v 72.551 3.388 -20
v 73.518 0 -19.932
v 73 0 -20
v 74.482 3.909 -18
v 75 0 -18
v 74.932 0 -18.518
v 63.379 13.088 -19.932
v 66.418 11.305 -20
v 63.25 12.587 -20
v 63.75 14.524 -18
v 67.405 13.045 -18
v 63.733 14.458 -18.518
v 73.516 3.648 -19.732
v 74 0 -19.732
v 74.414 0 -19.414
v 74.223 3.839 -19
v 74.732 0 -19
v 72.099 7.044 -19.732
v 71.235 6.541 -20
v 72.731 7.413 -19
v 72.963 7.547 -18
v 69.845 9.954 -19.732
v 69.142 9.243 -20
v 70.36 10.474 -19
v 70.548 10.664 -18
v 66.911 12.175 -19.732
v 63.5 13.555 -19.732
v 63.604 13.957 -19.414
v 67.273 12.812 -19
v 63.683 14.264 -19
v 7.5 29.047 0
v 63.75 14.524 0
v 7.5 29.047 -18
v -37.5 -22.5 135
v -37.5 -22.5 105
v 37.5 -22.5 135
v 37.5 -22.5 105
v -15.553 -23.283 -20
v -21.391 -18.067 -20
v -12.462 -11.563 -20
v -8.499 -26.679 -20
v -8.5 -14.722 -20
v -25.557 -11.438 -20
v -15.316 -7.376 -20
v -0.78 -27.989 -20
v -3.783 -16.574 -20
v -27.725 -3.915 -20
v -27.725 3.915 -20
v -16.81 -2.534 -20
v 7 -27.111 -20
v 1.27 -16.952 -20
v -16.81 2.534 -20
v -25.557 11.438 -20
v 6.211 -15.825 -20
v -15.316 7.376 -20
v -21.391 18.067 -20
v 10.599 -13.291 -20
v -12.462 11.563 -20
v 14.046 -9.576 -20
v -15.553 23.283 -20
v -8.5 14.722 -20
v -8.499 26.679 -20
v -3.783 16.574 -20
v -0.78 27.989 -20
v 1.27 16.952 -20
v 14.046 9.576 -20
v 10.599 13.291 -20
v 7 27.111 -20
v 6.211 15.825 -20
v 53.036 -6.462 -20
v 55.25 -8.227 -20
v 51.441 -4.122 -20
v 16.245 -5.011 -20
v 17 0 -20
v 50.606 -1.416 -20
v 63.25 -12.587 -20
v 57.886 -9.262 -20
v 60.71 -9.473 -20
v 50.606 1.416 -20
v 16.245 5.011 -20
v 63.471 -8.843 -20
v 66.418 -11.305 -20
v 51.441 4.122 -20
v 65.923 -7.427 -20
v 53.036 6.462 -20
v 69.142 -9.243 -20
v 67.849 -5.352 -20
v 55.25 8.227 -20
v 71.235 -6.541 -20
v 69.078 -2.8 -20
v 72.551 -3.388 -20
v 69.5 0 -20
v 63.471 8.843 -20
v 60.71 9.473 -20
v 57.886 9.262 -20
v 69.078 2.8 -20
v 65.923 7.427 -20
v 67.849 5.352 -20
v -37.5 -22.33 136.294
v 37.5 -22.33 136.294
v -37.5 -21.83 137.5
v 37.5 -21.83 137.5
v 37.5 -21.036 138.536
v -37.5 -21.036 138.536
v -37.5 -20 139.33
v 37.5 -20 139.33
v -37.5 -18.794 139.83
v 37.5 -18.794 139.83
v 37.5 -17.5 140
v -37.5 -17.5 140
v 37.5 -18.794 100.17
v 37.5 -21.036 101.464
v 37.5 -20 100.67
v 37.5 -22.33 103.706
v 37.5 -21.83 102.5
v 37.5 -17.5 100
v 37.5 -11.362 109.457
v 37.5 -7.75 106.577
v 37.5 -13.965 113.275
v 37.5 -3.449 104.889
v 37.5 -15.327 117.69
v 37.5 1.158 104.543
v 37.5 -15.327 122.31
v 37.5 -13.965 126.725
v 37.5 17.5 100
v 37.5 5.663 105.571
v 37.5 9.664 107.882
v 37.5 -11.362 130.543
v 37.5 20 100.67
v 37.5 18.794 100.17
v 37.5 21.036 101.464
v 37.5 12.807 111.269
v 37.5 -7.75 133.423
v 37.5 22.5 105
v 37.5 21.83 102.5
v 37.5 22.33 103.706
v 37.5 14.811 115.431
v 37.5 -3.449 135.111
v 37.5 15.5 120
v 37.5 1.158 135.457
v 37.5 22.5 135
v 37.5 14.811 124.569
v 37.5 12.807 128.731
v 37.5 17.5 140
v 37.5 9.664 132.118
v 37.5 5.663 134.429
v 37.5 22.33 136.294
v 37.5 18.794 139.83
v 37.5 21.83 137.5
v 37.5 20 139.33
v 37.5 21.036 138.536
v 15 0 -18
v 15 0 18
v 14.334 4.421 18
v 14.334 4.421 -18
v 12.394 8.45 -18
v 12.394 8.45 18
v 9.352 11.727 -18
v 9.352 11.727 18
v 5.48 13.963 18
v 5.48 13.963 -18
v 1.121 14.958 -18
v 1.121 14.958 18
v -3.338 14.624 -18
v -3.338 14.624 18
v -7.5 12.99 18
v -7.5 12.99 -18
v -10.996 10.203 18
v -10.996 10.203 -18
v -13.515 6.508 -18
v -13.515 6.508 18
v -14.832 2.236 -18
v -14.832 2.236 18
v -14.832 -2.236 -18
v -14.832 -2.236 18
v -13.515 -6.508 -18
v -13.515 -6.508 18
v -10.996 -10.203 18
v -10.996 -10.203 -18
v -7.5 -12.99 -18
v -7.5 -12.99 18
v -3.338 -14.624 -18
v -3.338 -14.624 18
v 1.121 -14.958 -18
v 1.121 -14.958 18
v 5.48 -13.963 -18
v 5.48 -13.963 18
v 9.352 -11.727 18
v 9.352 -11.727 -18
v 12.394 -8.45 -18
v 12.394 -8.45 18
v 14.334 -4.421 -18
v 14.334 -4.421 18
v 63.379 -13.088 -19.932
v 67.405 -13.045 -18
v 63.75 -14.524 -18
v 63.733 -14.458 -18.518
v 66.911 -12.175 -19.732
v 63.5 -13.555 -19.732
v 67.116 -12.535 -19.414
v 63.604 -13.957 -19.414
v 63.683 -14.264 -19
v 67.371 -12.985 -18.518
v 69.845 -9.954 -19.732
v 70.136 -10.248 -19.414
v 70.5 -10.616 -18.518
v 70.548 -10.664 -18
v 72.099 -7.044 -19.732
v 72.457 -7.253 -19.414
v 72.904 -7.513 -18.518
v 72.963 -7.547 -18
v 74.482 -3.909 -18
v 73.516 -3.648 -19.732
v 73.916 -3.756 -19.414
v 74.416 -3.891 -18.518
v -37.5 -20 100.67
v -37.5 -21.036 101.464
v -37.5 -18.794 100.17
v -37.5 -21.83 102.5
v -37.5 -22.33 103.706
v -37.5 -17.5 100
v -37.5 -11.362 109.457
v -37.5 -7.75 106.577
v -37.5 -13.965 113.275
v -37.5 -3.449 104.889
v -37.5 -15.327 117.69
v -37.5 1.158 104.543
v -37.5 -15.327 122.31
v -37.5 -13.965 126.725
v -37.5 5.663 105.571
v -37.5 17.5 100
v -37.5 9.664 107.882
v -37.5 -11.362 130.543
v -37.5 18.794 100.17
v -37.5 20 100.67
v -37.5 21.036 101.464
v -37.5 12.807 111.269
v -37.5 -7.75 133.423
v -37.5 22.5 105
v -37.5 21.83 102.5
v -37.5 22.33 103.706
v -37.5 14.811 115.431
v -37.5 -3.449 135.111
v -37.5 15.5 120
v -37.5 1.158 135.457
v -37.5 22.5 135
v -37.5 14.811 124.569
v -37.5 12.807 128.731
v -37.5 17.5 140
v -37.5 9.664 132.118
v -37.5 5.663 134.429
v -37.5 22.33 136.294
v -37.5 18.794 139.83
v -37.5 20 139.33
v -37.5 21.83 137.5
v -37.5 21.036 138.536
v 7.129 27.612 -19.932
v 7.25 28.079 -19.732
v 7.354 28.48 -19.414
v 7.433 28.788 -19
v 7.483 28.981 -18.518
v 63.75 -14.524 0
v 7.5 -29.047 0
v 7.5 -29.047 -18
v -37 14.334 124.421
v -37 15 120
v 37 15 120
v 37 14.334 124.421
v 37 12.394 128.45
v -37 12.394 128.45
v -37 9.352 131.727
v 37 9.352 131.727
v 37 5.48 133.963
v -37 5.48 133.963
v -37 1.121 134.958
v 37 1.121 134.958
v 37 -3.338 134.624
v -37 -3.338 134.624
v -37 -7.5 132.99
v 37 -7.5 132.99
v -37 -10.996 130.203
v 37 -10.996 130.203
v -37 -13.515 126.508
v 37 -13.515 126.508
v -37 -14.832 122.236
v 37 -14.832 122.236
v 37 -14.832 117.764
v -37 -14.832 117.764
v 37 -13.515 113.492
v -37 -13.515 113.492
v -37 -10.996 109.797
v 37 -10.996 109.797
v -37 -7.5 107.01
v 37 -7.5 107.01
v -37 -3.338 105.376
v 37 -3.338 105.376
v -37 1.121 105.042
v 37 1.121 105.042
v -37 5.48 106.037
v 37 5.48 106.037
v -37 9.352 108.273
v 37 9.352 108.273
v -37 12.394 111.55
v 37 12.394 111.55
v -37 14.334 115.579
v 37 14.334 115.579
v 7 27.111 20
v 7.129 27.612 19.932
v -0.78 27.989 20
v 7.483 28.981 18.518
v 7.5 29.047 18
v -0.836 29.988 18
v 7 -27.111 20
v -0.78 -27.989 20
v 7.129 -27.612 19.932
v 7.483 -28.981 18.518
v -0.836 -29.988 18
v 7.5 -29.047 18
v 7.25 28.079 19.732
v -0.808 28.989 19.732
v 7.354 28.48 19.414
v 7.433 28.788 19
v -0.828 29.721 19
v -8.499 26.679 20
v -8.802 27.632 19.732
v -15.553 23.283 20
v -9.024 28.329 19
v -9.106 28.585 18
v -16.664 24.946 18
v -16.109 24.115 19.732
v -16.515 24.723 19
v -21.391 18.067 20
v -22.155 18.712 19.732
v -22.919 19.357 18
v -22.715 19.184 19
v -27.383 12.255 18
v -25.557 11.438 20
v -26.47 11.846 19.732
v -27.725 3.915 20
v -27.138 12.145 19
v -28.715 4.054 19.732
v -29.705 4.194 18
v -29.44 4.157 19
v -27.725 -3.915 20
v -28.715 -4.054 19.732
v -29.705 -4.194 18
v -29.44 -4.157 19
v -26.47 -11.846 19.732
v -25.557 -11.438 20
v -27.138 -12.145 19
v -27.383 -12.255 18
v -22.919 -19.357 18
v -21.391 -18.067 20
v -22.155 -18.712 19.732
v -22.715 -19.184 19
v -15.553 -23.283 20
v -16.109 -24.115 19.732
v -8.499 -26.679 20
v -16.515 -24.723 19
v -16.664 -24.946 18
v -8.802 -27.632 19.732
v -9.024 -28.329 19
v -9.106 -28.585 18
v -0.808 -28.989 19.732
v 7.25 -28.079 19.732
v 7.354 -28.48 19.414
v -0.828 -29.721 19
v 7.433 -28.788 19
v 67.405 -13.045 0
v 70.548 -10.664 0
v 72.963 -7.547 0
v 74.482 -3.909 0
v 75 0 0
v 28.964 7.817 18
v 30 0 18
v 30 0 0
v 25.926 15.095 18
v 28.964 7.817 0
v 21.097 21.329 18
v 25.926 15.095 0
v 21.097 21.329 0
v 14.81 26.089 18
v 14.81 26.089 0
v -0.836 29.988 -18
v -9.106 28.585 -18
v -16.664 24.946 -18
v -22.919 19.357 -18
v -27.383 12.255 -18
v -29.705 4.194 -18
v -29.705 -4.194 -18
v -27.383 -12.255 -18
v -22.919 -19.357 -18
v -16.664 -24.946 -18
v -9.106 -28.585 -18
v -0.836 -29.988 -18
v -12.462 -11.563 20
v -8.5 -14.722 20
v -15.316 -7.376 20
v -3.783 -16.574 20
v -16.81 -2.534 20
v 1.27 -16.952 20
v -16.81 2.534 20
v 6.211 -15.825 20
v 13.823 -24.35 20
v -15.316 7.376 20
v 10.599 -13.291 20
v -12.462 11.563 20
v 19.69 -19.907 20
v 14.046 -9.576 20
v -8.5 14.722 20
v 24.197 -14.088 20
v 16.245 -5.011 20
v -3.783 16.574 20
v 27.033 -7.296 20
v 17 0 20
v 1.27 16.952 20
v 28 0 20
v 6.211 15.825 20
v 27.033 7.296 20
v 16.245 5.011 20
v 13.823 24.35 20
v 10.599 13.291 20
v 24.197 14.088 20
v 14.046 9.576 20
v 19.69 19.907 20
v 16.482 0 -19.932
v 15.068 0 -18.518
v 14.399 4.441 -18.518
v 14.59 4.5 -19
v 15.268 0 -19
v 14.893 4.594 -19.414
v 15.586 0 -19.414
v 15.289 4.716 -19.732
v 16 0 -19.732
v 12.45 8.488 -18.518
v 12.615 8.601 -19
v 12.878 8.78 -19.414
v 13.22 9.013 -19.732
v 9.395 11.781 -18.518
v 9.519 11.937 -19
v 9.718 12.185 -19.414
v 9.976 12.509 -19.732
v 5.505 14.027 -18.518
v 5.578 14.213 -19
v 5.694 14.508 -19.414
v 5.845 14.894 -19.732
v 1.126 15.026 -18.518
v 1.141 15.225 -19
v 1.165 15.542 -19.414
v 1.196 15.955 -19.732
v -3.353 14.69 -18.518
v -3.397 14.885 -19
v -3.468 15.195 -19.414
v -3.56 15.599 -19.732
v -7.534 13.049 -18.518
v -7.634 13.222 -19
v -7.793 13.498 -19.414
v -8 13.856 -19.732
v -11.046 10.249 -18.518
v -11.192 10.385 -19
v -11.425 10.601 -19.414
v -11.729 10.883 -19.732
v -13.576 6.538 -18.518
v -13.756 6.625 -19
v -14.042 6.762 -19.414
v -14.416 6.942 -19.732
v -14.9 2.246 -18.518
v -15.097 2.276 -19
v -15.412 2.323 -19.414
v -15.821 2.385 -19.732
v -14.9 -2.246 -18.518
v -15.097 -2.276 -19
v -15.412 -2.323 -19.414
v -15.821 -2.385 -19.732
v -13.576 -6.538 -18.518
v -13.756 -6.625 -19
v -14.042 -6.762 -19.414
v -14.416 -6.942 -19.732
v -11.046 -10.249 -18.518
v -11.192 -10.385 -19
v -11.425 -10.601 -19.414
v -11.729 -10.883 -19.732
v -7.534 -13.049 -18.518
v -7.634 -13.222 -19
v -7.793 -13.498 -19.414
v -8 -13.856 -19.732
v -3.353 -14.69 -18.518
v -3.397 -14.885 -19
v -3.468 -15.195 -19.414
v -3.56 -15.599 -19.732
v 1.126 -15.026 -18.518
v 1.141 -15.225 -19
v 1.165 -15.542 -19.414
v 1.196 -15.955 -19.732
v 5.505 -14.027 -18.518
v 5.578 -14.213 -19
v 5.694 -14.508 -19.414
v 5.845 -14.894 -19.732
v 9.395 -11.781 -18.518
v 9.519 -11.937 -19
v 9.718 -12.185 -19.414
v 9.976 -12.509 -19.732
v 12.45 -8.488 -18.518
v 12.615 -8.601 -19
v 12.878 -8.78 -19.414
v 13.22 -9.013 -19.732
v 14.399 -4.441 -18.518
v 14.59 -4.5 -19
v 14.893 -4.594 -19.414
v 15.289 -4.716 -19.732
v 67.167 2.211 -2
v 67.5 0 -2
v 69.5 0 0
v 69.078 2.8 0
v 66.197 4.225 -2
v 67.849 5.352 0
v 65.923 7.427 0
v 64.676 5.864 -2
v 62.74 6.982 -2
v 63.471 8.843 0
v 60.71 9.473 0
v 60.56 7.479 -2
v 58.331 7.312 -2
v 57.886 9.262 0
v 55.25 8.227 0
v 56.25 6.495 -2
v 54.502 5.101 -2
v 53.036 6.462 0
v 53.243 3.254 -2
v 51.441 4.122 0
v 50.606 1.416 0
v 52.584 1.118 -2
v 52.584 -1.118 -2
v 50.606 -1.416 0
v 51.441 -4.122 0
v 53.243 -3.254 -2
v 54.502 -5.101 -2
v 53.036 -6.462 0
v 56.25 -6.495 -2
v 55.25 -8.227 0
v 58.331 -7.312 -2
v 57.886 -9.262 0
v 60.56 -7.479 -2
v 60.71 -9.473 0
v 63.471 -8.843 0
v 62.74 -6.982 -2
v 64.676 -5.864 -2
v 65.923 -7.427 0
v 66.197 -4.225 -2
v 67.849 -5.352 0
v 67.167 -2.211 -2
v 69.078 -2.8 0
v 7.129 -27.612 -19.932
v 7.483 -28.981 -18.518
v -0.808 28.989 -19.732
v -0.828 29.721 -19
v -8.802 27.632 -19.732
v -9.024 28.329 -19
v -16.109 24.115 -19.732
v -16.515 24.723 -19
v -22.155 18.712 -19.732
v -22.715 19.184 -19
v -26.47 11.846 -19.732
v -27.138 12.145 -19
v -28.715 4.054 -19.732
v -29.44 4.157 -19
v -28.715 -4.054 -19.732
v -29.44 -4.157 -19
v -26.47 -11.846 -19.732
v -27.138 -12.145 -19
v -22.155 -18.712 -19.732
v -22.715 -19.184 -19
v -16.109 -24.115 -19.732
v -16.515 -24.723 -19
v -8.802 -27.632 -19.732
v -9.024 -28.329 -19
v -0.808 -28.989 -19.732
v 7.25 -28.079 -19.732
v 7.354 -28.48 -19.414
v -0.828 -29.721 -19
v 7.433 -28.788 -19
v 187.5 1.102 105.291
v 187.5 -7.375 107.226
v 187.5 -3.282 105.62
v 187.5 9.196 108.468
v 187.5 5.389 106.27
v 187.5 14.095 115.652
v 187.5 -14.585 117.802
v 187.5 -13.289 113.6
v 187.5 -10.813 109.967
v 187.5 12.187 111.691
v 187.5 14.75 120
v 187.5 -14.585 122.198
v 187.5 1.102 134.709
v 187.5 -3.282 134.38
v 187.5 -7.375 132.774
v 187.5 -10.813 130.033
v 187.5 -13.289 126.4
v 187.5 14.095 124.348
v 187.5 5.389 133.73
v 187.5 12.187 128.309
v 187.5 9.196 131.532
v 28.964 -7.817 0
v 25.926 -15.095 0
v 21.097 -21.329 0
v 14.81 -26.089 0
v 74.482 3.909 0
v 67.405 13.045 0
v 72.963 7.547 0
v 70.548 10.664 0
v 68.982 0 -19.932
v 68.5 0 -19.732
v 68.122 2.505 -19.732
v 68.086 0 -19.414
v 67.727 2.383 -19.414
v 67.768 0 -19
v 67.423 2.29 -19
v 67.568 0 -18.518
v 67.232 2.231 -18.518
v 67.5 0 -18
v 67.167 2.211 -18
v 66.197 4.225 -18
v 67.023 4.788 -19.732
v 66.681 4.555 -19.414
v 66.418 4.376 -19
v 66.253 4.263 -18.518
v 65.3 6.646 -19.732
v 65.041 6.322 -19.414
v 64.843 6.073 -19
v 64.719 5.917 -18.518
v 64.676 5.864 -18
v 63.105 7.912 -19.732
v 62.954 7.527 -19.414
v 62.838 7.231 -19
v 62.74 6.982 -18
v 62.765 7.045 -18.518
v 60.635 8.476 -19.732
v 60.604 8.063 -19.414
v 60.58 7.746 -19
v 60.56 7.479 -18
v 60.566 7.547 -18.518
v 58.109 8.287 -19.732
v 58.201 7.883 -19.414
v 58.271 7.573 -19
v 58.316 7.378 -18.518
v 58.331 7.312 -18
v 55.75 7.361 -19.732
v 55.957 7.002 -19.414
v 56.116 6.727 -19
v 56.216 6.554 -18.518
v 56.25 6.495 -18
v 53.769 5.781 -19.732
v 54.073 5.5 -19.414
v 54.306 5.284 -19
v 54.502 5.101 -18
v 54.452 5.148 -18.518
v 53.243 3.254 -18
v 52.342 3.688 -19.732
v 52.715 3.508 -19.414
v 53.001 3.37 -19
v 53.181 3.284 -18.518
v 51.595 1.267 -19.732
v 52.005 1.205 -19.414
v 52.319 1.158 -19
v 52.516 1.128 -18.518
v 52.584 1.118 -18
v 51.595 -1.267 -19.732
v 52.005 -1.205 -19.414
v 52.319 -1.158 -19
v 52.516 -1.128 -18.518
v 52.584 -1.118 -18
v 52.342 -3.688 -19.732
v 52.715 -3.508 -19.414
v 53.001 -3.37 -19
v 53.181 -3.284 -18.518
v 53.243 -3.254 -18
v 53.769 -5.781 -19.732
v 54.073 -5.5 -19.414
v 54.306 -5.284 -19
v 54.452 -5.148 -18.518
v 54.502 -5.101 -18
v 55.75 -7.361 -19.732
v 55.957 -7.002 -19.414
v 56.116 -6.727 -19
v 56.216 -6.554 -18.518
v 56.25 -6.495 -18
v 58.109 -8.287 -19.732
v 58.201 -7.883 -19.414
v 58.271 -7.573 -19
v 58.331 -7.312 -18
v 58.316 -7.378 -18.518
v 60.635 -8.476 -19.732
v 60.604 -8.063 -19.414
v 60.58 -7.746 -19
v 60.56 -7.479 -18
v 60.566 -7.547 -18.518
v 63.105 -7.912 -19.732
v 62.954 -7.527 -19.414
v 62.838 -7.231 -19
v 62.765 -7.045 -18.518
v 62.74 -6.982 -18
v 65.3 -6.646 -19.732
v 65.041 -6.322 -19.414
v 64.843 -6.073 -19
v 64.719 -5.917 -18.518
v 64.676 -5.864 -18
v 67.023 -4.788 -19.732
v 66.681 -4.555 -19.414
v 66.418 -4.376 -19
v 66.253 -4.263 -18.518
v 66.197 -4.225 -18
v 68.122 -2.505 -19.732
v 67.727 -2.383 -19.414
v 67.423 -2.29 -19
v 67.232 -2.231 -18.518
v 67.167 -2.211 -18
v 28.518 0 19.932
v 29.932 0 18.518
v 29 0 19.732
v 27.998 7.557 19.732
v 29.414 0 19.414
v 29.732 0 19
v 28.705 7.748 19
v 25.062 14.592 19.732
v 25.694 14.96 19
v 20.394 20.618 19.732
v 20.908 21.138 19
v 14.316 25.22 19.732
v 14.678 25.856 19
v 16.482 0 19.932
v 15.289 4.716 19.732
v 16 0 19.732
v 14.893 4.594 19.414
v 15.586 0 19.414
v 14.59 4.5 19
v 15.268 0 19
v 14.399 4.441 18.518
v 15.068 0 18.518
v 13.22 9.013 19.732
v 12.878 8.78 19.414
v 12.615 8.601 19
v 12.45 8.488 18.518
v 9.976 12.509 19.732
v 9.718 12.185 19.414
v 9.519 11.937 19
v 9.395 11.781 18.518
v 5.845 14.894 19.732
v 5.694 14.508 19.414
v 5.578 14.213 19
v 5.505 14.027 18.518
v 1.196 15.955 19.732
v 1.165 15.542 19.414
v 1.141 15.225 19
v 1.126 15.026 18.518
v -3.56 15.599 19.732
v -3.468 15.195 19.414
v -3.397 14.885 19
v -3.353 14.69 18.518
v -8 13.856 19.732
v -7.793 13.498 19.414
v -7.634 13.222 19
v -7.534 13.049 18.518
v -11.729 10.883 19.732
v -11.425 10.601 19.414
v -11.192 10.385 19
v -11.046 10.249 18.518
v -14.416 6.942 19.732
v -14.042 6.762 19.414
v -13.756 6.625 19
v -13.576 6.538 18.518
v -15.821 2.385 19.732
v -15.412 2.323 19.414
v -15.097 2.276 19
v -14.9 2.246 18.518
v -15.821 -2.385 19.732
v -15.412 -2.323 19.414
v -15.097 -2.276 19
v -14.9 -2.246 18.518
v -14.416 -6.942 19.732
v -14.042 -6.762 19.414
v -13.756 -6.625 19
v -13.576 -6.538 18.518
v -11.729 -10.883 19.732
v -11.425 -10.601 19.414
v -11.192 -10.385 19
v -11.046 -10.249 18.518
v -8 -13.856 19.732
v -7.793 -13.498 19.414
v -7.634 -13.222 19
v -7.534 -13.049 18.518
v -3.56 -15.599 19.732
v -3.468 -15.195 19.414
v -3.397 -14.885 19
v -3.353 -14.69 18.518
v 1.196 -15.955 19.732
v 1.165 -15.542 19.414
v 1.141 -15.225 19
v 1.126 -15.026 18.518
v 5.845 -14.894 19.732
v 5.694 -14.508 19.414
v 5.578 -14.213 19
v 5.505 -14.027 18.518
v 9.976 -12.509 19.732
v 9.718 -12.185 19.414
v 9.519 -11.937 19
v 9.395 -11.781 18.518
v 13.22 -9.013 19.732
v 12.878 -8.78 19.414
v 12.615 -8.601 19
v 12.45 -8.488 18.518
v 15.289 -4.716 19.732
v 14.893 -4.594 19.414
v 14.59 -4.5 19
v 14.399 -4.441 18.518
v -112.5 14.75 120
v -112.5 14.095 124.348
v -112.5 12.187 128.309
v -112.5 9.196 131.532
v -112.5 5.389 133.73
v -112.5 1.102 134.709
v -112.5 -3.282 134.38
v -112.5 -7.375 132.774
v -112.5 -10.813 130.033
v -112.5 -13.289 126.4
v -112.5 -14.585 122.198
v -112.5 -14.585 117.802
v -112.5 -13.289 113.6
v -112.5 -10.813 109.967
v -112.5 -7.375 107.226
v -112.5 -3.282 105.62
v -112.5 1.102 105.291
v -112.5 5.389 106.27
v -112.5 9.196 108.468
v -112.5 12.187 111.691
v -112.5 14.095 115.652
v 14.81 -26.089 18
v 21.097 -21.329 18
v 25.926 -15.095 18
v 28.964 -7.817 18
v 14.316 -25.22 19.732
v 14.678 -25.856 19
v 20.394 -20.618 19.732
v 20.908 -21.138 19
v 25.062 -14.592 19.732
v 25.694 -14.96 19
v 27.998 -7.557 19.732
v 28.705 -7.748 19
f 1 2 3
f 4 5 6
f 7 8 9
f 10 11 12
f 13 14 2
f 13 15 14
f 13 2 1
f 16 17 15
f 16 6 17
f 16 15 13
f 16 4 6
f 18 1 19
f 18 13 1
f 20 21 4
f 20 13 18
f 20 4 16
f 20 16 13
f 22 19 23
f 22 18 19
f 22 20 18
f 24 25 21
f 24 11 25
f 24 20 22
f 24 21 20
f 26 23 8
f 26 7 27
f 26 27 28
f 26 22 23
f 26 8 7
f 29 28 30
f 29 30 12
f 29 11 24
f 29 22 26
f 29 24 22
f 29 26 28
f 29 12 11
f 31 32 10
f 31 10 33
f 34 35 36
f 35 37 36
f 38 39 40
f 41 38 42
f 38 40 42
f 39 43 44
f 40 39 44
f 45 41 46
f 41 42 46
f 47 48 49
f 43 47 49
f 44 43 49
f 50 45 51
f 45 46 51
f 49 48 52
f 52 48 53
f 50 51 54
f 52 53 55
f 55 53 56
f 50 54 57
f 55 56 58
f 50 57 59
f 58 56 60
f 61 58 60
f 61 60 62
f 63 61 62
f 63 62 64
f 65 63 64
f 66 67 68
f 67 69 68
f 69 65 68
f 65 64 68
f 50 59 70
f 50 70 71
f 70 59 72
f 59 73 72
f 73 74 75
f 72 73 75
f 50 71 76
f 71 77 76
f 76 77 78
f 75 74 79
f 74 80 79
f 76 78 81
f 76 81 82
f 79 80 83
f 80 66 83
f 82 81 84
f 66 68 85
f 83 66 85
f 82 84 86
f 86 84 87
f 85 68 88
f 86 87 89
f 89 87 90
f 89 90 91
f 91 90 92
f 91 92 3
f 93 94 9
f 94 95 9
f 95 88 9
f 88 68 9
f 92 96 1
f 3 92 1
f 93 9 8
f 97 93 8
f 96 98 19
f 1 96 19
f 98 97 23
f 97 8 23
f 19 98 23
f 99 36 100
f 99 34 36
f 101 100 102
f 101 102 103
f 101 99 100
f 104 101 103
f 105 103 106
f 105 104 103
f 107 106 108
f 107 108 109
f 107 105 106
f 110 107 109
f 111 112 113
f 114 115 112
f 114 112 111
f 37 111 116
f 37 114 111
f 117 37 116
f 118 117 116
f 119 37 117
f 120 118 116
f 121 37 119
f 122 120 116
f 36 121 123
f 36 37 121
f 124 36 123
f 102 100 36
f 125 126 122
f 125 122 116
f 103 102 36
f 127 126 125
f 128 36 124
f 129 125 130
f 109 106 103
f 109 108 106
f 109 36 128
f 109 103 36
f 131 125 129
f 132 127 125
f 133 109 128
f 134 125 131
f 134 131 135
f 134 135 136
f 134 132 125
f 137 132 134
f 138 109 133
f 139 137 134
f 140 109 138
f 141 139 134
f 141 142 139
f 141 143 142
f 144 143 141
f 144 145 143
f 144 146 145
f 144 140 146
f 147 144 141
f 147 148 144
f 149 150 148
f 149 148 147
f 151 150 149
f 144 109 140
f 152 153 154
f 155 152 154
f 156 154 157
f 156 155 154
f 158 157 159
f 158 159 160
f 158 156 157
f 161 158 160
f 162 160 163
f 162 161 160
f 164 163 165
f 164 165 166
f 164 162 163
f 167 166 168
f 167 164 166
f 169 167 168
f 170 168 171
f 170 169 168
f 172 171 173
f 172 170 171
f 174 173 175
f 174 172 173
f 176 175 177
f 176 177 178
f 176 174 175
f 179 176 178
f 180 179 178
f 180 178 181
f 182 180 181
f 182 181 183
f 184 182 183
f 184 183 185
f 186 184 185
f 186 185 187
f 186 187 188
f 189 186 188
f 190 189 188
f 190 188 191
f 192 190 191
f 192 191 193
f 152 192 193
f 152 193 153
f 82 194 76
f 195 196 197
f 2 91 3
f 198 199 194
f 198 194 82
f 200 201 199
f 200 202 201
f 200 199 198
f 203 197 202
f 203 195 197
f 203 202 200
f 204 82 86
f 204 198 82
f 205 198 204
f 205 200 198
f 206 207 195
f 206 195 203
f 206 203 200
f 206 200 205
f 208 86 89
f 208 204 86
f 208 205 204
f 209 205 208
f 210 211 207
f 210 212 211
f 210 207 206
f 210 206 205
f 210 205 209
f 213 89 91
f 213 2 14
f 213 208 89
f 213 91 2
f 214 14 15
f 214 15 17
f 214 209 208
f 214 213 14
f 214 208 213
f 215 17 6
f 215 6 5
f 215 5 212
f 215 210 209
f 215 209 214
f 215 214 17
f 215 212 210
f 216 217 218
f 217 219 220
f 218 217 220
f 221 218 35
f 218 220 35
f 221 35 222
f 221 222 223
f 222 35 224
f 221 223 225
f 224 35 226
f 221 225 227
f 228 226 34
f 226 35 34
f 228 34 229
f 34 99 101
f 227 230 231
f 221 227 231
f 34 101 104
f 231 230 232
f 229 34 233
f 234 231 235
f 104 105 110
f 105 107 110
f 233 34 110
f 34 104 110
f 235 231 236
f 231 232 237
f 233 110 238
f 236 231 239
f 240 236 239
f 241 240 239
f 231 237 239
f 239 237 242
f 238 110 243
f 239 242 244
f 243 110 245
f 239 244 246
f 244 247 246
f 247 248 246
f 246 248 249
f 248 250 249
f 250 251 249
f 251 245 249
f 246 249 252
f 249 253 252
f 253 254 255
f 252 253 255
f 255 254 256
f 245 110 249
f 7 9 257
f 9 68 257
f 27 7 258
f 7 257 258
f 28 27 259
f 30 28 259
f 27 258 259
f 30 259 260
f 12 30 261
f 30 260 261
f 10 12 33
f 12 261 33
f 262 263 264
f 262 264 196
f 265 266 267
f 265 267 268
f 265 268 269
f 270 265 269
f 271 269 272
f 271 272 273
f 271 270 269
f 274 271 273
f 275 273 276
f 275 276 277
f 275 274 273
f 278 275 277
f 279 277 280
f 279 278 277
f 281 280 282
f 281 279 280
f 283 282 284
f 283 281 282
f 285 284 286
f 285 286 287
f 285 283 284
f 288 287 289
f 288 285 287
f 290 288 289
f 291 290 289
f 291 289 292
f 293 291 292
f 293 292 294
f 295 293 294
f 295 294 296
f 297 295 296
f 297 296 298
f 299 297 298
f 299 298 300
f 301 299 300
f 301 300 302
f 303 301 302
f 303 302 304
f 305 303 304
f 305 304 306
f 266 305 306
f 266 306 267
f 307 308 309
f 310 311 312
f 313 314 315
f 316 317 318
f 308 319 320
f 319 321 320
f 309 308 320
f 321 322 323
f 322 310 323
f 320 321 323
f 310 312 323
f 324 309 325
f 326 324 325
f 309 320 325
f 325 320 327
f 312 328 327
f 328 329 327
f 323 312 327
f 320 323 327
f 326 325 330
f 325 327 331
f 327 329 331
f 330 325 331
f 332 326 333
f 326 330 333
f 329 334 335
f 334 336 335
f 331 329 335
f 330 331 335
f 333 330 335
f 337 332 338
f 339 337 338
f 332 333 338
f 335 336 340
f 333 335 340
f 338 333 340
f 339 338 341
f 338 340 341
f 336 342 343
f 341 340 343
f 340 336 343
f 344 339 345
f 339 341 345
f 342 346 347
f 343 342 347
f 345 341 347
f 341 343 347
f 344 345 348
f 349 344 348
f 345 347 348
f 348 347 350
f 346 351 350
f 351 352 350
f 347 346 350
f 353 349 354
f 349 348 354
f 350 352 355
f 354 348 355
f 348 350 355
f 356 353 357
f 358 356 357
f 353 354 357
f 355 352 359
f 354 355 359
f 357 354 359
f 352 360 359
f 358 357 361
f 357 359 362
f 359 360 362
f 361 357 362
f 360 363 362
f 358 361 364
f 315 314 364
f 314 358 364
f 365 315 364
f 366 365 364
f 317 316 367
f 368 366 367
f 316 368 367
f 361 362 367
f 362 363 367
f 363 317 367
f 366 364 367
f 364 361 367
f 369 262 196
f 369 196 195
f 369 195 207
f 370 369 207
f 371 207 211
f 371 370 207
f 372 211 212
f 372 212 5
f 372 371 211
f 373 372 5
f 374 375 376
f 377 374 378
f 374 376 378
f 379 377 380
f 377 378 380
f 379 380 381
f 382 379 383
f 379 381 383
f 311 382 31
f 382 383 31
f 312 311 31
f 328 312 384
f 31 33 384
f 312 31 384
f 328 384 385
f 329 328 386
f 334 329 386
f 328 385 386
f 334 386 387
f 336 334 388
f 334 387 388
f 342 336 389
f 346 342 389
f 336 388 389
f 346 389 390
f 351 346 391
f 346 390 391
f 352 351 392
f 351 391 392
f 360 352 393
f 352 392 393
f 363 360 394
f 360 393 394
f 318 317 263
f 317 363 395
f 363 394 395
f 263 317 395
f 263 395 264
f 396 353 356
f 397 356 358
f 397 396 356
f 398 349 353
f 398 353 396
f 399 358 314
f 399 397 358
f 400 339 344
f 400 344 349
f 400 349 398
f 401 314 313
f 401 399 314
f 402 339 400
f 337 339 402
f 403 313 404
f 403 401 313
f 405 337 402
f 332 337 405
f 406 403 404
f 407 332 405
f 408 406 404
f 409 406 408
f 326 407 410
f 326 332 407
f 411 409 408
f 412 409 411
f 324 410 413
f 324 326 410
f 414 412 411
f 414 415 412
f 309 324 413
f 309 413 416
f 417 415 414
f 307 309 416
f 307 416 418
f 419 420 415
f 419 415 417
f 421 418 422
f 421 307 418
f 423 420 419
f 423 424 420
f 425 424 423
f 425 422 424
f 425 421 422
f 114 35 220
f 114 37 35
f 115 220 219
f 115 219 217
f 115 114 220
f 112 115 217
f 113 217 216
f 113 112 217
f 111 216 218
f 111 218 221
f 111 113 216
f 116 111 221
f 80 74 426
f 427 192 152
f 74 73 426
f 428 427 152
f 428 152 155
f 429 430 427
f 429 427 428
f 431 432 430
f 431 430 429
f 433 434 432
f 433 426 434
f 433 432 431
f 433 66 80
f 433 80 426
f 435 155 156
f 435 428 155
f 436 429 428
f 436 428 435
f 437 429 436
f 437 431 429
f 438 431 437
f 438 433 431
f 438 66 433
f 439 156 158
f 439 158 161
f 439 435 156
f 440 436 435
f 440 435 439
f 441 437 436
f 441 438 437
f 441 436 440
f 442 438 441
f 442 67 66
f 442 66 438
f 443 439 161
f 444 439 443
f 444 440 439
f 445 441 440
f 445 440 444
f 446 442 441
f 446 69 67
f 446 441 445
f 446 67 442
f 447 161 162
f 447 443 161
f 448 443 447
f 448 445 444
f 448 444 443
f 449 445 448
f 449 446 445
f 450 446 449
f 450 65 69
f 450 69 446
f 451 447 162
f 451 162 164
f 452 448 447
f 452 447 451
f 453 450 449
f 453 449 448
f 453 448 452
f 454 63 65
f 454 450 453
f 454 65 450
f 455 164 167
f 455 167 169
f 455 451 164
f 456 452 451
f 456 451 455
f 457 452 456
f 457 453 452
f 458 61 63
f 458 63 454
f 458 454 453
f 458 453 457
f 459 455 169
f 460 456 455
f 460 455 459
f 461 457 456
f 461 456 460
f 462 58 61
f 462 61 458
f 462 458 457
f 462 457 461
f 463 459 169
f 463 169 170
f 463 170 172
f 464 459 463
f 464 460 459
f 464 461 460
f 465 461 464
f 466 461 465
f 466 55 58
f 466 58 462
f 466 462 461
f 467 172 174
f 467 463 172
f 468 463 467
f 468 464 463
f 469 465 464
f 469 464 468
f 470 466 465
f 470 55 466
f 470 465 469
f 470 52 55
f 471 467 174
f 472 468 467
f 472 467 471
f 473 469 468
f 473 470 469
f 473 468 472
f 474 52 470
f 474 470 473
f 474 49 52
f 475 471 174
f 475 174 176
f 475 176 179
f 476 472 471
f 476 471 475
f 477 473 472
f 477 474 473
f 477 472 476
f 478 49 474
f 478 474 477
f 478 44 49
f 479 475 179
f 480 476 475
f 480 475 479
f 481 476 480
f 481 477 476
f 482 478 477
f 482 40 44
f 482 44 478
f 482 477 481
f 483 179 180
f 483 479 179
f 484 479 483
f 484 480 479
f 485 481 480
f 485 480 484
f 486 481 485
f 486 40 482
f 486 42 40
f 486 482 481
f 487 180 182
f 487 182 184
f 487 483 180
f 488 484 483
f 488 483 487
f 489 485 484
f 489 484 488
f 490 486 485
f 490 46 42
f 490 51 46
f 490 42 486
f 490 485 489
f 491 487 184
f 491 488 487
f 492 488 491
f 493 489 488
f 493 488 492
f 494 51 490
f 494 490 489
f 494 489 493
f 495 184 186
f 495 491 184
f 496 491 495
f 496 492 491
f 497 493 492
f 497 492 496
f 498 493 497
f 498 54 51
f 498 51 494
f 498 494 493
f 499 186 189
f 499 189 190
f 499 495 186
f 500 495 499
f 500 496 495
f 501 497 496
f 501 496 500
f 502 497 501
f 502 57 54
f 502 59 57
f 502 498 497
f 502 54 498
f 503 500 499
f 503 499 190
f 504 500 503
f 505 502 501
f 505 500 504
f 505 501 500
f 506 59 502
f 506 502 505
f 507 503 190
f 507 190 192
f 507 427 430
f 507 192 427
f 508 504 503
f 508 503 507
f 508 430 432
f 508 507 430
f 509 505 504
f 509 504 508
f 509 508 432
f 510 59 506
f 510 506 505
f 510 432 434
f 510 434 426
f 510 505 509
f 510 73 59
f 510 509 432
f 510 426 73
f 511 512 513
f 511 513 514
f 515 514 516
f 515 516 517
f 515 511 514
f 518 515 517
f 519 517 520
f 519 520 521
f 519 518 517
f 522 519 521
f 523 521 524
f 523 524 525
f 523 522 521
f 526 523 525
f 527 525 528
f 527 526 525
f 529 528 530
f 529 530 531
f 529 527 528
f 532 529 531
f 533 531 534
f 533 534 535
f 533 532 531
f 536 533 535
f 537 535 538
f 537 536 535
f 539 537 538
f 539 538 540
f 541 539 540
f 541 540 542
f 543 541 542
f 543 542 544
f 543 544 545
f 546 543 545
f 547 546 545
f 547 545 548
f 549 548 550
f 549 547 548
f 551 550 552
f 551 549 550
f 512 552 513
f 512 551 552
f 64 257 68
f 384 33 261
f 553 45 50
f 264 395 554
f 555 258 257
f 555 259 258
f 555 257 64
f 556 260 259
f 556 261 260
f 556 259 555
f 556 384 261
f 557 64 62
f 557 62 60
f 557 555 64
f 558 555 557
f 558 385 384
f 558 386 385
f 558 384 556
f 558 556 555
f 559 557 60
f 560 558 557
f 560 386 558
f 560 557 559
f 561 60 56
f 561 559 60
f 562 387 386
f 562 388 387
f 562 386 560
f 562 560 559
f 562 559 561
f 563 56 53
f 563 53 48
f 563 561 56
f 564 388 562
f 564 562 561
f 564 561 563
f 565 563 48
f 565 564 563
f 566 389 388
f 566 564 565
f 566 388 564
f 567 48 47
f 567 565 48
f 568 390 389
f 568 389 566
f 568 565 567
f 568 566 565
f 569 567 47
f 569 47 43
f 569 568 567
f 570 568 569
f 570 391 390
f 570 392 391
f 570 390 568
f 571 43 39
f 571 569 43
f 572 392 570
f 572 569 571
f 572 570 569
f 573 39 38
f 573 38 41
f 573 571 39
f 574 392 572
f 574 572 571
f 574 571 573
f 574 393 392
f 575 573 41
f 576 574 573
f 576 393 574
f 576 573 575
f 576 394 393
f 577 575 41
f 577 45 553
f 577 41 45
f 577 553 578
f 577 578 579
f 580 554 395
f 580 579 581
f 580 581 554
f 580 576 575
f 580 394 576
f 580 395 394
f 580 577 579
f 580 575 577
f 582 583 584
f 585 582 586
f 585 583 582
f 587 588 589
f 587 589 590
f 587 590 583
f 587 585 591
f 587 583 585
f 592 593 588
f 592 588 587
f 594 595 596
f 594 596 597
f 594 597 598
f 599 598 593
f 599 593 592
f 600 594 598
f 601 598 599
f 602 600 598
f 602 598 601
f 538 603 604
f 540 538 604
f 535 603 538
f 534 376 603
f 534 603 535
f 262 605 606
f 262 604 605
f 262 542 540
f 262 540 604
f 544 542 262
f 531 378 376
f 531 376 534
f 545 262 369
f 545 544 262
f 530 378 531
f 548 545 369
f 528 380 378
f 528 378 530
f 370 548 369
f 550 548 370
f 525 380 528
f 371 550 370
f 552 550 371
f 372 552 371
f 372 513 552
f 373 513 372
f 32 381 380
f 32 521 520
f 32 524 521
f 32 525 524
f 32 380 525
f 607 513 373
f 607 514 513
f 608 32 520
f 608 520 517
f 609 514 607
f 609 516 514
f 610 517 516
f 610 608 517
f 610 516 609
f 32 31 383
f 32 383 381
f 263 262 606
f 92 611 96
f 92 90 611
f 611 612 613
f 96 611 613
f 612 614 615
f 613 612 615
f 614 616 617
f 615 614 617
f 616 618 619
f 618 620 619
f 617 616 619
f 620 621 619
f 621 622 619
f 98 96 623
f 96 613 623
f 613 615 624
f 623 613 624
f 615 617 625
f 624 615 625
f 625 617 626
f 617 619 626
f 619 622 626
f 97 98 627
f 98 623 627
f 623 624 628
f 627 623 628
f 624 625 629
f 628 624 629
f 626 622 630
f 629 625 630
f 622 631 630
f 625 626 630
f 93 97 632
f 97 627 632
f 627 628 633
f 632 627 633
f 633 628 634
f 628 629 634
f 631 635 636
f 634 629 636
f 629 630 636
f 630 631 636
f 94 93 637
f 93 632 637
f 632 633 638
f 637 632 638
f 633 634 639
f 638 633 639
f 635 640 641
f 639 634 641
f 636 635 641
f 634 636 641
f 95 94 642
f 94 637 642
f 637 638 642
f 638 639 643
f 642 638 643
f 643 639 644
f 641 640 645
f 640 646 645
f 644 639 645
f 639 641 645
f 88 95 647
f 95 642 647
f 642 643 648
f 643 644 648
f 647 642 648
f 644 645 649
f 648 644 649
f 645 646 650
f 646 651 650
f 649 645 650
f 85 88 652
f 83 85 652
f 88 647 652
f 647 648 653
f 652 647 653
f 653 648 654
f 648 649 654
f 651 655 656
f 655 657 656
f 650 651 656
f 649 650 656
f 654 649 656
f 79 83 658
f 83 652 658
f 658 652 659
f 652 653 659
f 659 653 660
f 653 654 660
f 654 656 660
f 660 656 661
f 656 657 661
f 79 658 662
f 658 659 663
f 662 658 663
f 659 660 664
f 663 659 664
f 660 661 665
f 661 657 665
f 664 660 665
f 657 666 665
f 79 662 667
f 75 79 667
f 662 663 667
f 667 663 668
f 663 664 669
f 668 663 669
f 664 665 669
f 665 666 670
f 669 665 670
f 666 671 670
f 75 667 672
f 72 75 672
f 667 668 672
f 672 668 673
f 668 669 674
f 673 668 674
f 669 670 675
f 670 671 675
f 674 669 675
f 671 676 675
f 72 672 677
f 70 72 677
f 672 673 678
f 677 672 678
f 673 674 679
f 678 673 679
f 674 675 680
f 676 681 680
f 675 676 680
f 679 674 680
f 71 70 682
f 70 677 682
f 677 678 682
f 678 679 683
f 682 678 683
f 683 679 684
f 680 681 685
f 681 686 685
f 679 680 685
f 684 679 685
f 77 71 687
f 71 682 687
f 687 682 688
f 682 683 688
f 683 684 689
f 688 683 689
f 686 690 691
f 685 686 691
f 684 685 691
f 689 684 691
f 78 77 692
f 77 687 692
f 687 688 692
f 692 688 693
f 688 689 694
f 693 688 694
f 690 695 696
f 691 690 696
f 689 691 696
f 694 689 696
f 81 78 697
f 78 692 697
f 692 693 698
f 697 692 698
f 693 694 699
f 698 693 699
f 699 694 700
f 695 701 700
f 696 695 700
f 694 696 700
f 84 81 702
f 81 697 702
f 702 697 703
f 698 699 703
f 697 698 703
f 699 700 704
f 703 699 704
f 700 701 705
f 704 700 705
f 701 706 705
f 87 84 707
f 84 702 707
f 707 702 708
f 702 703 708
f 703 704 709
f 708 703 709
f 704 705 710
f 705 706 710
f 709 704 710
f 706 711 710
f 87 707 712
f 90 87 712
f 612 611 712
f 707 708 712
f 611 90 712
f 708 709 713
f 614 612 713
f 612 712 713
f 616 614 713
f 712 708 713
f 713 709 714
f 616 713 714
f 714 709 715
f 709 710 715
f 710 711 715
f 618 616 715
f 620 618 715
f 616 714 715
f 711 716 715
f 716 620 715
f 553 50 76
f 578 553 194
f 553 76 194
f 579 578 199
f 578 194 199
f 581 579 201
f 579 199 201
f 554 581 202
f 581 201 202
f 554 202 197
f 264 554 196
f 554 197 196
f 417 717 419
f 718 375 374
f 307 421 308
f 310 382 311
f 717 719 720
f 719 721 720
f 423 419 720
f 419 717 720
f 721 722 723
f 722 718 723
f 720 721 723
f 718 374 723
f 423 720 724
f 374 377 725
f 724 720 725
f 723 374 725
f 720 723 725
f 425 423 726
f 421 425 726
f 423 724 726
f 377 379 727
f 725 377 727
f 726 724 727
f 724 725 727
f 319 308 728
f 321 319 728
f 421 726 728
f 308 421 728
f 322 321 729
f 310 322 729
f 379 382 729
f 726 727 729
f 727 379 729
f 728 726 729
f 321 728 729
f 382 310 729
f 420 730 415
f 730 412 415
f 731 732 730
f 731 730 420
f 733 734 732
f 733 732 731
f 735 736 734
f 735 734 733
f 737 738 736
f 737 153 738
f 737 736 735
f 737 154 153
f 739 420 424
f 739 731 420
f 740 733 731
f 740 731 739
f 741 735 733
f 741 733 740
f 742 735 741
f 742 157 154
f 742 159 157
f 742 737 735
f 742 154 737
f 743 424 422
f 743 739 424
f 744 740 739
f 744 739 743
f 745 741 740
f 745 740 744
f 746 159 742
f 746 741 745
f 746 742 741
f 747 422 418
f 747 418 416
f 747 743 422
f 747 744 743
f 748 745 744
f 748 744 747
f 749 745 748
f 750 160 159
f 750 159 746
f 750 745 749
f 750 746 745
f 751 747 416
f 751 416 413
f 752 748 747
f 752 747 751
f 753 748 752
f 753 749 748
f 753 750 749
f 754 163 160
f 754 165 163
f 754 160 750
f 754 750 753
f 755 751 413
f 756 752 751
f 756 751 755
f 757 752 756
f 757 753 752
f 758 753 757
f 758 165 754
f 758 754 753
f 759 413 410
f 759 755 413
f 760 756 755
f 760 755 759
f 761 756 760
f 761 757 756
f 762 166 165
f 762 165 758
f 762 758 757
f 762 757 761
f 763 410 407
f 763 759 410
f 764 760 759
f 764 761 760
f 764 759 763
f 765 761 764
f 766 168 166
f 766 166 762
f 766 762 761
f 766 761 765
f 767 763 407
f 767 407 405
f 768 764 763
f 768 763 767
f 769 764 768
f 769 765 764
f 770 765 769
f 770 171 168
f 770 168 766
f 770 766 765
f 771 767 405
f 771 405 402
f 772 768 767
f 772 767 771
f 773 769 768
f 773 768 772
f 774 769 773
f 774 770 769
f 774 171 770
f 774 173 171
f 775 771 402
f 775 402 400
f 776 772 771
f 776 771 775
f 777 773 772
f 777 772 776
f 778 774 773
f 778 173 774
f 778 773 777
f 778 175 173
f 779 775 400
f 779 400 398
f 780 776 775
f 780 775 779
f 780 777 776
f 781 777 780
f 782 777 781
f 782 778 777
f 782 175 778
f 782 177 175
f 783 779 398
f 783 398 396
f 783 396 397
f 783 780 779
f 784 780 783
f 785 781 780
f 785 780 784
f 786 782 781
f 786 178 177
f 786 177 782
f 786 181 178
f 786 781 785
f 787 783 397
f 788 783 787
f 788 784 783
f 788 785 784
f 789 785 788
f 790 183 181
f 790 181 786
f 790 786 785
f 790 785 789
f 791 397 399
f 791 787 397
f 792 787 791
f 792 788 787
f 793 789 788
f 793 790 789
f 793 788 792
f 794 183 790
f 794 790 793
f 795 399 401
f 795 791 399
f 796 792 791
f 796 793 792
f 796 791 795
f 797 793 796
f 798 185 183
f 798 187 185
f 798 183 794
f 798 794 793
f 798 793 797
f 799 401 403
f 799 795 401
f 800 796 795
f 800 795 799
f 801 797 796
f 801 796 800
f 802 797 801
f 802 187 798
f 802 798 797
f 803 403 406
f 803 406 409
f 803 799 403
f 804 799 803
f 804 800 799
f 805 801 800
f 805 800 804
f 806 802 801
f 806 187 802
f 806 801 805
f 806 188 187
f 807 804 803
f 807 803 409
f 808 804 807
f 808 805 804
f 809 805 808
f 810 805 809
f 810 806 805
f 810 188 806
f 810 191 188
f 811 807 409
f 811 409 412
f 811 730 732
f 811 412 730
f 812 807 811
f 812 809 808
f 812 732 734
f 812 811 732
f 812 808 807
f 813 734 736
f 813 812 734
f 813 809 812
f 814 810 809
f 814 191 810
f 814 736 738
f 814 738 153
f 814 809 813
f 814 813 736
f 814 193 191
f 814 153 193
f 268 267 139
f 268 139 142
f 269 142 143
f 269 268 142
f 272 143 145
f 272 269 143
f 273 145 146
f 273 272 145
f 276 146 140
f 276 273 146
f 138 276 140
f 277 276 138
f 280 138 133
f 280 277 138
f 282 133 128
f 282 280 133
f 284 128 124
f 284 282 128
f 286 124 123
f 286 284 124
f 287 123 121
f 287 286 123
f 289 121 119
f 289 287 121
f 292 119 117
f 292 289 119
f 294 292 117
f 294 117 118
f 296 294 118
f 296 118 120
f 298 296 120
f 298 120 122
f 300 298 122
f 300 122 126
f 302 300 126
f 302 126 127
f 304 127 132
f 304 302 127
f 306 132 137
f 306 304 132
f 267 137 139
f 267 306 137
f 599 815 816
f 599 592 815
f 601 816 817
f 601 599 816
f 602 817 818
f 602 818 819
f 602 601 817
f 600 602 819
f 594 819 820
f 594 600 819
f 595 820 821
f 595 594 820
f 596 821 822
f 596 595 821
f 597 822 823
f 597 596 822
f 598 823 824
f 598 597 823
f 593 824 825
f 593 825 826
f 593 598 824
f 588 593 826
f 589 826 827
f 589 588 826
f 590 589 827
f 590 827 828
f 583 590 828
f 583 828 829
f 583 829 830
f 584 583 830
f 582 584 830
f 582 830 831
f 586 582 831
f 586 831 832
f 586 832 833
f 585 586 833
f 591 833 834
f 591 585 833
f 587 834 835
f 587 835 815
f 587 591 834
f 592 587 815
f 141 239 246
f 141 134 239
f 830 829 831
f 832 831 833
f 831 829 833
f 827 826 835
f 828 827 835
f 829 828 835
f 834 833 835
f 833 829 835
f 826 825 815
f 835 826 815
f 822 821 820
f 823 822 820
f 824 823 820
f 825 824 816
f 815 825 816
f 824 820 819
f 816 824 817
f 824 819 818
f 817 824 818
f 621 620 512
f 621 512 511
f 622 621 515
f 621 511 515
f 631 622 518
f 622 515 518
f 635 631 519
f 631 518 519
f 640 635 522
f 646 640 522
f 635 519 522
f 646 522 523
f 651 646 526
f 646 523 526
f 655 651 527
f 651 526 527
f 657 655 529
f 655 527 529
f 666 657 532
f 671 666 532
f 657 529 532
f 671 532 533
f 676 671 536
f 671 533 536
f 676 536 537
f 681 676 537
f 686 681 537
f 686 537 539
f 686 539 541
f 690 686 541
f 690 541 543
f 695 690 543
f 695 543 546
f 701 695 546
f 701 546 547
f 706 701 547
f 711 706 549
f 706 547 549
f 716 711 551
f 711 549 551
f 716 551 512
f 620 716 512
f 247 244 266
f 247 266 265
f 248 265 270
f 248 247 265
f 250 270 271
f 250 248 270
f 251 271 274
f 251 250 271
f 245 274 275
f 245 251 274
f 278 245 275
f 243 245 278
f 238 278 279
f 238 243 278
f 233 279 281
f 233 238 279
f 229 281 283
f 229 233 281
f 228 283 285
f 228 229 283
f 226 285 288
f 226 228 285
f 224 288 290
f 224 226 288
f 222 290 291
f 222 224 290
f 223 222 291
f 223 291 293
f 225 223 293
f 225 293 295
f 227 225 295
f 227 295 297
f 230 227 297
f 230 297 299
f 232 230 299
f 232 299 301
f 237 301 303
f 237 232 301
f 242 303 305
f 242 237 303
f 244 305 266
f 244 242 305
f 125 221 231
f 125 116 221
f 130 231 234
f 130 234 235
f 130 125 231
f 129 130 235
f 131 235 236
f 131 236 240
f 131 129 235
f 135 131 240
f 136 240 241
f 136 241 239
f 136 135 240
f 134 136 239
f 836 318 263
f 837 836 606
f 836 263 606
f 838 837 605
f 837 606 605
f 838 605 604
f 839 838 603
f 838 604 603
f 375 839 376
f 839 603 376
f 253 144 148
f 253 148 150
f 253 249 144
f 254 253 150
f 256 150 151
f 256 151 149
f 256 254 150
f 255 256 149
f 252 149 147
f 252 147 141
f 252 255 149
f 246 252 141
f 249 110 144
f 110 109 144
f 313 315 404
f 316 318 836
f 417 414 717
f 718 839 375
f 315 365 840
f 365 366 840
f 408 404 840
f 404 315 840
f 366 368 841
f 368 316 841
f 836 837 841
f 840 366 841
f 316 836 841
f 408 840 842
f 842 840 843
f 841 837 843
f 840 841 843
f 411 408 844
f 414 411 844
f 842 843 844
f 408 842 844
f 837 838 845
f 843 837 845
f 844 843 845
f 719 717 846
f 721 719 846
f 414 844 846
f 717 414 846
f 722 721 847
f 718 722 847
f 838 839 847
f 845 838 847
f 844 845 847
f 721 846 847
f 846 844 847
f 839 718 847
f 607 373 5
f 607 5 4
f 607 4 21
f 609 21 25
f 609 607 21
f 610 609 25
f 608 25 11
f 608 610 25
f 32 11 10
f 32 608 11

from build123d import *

# Parameters (mm, degrees)
F0_R      = 15
F0_R_2    = 7.5
F1_DEPTH  = 20
F2_DEPTH  = 20
F3_R      = 2
F4_SIZE   = 2
F5_W      = 45
F5_H      = 40
F5_R      = 15
F6_DEPTH  = 37.5
F7_SIZE   = 0.5
F8_R      = 5
F9_R      = 14.75
F10_DEPTH = 150


with BuildPart() as f1:
    # F0 (on Top) → F1 (new body)
    with BuildSketch(Plane.XY):
        with BuildLine():
            ThreePointArc((7.5, -29.047375), (23.717082, -18.371173), (30, 0))
            ThreePointArc((30, 0), (23.717082, 18.371173), (7.5, 29.047375))
            ThreePointArc((7.5, 29.047375), (-30, 0), (7.5, -29.047375))
        make_face()
        Circle(F0_R, mode=Mode.SUBTRACT)
        with BuildLine():
            ThreePointArc((7.5, 29.047375), (23.717082, 18.371173), (30, 0))
            ThreePointArc((30, 0), (23.717082, -18.371173), (7.5, -29.047375))
            Line((7.5, -29.047375), (63.75, -14.523688))
            ThreePointArc((63.75, -14.523688), (45, 0), (63.75, 14.523688))
            Line((63.75, 14.523688), (7.5, 29.047375))
        make_face()
        with BuildLine():
            ThreePointArc((75, 0), (71.858541, 9.185587), (63.75, 14.523688))
            ThreePointArc((63.75, 14.523688), (45, 0), (63.75, -14.523688))
            ThreePointArc((63.75, -14.523688), (71.858541, -9.185587), (75, 0))
        make_face()
        with Locations((60, 0)):
            Circle(F0_R_2, mode=Mode.SUBTRACT)
    extrude(amount=-F1_DEPTH)

    # F0 (on Top) → F2 (join)
    with BuildSketch(Plane.XY):
        with BuildLine():
            ThreePointArc((7.5, -29.047375), (23.717082, -18.371173), (30, 0))
            ThreePointArc((30, 0), (23.717082, 18.371173), (7.5, 29.047375))
            ThreePointArc((7.5, 29.047375), (-30, 0), (7.5, -29.047375))
        make_face()
        Circle(F0_R, mode=Mode.SUBTRACT)
    extrude(amount=F2_DEPTH)

    # F3
    f3_edges = [f1.edges().sort_by_distance(p)[0] for p in [
        (-7.5, 29.047375, 20),
        (-15, 0, 20),
        (-30, 0, -20),
        (35.625, -21.785531, -20),
        (75, 0, -20),
        (35.625, 21.785531, -20),
        (-15, 0, -20),
        (52.5, 0, -20),
    ]]
    fillet(f3_edges, radius=F3_R)

    # F4
    f4_edges = [f1.edges().sort_by_distance(p)[0] for p in [
        (52.5, 0, 0),
    ]]
    chamfer(f4_edges, length=F4_SIZE)


with BuildPart() as f6:
    # F5 (on Right) → F6 (new body, symmetric)
    with BuildSketch(Plane.YZ):
        with Locations((0, 120)):
            Rectangle(F5_W, F5_H)
        with Locations((0, 120)):
            Circle(F5_R, mode=Mode.SUBTRACT)
    extrude(amount=F6_DEPTH, both=True)

    # F7
    f7_edges = [f6.edges().sort_by_distance(p)[0] for p in [
        (-37.5, -15, 120),
        (37.5, -15, 120),
    ]]
    chamfer(f7_edges, length=F7_SIZE)

    # F8
    f8_edges = [f6.edges().sort_by_distance(p)[0] for p in [
        (0, 22.5, 140),
        (0, -22.5, 140),
        (0, 22.5, 100),
        (0, -22.5, 100),
    ]]
    fillet(f8_edges, radius=F8_R)


with BuildPart() as f10:
    # F9 (on face) → F10 (new body, symmetric)
    with BuildSketch(Plane.YZ.offset(37.5)):
        with Locations((0, 120)):
            Circle(F9_R)
    extrude(amount=F10_DEPTH, both=True)


solid = Compound([f1.part, f6.part, f10.part])
